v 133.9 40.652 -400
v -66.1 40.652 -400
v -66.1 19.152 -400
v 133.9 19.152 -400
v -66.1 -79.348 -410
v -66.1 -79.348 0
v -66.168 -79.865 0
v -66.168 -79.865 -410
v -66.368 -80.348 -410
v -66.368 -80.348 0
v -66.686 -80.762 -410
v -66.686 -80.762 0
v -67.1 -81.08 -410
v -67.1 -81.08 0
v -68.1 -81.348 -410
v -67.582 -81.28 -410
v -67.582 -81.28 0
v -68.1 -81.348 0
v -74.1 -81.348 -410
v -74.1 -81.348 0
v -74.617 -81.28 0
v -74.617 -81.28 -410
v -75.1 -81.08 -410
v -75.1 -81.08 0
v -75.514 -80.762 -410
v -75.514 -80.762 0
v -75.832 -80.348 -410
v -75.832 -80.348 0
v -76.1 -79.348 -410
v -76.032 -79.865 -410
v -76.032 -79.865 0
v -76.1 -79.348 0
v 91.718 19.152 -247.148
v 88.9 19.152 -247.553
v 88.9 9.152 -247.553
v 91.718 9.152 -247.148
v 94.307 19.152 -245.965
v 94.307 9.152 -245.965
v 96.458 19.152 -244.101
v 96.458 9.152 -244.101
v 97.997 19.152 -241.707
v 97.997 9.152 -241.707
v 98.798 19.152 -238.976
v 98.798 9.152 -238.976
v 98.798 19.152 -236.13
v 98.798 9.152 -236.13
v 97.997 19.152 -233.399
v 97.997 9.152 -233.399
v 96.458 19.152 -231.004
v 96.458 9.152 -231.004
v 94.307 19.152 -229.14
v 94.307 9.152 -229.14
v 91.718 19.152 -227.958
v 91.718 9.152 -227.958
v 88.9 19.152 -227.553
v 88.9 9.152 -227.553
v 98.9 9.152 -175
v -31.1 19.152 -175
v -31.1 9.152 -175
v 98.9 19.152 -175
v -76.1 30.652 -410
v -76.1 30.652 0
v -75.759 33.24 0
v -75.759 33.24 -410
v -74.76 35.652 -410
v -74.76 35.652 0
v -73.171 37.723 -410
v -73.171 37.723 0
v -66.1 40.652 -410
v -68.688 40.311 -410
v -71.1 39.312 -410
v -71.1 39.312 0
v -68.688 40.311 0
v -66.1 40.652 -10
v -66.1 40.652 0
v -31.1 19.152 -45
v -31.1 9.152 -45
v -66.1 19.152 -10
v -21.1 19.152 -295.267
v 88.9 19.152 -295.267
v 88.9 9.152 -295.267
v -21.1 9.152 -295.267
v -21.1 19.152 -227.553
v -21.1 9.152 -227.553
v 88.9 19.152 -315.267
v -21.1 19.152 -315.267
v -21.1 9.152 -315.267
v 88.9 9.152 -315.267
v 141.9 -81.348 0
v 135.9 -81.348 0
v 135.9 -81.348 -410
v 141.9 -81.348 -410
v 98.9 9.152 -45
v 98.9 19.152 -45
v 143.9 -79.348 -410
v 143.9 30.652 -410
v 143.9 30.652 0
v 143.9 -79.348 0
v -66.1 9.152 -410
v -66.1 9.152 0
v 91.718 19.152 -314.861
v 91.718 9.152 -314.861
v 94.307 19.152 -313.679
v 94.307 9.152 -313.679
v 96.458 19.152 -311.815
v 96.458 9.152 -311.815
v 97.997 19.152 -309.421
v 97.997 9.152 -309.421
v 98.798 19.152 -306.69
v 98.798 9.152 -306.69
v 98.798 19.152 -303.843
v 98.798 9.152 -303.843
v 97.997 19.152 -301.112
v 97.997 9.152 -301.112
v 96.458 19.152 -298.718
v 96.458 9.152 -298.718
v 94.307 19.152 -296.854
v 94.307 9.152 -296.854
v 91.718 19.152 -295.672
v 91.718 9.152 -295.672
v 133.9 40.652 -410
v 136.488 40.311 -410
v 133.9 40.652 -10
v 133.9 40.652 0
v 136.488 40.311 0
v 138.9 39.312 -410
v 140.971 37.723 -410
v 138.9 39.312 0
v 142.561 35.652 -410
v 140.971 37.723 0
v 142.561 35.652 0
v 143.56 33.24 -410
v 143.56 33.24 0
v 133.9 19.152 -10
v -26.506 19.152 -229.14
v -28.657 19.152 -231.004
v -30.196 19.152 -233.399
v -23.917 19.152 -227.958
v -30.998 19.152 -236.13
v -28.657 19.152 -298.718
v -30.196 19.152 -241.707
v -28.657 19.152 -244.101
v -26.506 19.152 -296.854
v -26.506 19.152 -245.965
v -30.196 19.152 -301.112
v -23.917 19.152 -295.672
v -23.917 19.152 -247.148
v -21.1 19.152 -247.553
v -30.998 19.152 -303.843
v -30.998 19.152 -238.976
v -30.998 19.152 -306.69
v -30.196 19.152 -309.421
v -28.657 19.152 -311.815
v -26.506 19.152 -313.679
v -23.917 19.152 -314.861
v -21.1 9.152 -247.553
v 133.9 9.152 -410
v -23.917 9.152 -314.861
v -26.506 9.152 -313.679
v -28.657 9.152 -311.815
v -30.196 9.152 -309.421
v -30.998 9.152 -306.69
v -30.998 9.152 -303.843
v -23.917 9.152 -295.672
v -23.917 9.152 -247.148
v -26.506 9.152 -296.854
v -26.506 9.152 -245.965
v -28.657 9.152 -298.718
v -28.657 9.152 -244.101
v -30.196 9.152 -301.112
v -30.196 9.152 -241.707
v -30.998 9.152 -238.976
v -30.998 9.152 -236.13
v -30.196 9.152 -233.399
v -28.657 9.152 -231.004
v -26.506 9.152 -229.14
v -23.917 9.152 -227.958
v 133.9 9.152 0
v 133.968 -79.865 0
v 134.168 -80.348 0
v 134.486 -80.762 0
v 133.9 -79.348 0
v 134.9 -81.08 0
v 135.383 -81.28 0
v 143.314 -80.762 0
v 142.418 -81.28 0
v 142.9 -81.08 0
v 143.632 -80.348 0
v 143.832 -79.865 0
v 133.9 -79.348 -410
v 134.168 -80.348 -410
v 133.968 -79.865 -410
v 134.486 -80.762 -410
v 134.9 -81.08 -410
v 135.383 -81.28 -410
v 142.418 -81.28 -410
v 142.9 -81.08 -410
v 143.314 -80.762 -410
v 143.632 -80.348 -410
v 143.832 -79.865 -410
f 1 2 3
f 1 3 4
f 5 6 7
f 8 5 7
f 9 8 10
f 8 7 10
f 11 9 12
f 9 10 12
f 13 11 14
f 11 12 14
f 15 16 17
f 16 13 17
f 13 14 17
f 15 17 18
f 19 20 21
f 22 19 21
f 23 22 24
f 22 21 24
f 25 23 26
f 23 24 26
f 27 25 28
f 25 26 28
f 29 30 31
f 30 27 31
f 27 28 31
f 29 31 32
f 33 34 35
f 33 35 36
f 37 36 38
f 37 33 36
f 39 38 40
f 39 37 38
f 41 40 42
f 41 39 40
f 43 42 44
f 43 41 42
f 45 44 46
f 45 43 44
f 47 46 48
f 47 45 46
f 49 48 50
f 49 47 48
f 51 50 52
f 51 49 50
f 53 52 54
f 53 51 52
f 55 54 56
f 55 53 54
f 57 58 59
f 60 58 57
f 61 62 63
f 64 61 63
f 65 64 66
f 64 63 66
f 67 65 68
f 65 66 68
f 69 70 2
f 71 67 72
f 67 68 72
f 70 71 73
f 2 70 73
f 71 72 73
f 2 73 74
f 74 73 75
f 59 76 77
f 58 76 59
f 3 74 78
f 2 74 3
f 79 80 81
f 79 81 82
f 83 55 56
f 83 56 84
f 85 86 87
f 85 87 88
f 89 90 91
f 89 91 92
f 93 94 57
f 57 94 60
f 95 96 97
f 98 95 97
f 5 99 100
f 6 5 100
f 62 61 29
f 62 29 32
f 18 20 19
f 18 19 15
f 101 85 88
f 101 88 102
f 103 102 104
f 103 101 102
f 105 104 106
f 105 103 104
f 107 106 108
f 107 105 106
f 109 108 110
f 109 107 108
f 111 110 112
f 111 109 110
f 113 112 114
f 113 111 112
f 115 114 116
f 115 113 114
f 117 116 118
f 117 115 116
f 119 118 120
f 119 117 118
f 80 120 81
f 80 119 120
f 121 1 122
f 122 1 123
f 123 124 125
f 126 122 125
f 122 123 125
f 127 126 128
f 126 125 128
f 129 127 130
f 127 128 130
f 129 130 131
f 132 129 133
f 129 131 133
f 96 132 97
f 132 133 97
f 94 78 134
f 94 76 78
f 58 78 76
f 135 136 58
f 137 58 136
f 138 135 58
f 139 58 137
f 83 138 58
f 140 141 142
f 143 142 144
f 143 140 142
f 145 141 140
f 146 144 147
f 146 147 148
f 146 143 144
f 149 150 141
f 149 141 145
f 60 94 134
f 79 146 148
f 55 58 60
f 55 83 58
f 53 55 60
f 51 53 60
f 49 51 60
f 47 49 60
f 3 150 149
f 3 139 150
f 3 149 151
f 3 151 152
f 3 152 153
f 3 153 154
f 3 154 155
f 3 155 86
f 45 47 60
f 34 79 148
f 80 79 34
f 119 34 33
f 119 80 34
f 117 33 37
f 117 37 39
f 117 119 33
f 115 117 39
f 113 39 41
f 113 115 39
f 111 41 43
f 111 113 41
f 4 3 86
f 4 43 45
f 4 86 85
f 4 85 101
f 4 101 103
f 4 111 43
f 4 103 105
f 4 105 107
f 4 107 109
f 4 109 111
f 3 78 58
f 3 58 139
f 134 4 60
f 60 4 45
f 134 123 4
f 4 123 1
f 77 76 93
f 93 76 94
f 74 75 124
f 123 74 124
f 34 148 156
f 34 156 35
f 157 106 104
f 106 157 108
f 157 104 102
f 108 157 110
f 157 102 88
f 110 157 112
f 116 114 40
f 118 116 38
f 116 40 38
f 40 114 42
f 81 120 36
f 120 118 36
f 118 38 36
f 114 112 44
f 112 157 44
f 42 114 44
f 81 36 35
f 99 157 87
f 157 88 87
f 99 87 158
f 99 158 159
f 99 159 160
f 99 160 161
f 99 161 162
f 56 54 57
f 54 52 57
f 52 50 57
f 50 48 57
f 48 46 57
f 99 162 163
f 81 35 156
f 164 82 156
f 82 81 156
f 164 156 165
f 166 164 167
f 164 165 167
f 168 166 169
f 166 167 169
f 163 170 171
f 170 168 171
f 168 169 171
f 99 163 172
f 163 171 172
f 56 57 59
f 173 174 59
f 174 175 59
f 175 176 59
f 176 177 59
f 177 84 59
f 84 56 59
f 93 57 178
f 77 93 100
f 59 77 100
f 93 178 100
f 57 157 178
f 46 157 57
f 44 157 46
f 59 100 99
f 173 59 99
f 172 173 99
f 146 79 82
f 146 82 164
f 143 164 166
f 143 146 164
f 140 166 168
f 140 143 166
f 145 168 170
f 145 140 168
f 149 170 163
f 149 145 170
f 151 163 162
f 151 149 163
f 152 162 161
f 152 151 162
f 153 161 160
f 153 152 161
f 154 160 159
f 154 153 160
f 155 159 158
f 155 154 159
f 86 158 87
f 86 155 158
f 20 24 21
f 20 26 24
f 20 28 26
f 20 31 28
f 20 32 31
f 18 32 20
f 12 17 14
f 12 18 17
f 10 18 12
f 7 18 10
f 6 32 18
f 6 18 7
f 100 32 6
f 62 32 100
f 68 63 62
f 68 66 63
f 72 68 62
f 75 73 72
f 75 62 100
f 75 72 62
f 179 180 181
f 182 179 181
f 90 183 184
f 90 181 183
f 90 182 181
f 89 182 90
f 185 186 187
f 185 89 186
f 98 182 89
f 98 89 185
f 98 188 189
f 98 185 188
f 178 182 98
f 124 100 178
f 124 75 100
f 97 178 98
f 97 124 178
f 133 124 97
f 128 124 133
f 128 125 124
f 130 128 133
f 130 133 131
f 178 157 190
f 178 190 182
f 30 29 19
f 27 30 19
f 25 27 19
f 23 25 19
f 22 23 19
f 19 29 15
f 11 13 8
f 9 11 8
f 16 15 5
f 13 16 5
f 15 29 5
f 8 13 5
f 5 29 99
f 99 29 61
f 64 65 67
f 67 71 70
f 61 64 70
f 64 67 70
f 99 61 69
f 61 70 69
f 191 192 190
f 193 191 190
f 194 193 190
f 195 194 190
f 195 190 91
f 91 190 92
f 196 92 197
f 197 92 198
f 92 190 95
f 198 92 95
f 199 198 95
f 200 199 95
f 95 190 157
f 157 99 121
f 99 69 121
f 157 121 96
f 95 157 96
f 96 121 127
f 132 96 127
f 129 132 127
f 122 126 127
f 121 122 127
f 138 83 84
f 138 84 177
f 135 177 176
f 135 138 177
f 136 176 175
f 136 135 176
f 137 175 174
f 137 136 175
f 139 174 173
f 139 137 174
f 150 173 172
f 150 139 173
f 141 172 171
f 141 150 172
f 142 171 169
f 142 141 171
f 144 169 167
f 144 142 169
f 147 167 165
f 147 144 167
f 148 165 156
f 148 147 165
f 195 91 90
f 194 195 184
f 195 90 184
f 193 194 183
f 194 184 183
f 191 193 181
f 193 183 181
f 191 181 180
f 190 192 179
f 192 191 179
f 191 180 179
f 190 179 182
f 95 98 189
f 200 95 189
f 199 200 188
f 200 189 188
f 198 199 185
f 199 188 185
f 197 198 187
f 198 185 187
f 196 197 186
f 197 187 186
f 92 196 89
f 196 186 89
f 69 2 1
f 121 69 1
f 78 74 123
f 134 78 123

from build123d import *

# Parameters (mm, degrees)
BOSS_EXTRUDE1_DEPTH = 410
SKETCH4_W           = 200
SKETCH4_H           = 390
CUT_EXTRUDE1_DEPTH  = 21.5
SKETCH5_W           = 130
SKETCH5_H           = 130
CUT_EXTRUDE2_DEPTH  = 30
SKETCH9_W           = 10
SKETCH9_H           = 410
BOSS_EXTRUDE2_DEPTH = 2
SKETCH10_W          = 10
SKETCH10_H          = 410
BOSS_EXTRUDE3_DEPTH = 2
CUT_EXTRUDE4_DEPTH  = 600


with BuildPart() as part:
    # Sketch3 → Boss-Extrude1 (new body)
    with BuildSketch(Plane.XY):
        Polygon((-76.099744246, 40.652173913), (143.900255754, 40.652173913), (143.900255754, -79.347826087), (133.900255754, -79.347826087), (133.900255754, 9.152173913), (-66.099744246, 9.152173913), (-66.099744246, -79.347826087), (-76.099744246, -79.347826087), align=None)
    extrude(amount=-BOSS_EXTRUDE1_DEPTH)

    # Sketch4 → Cut-Extrude1 (cut)
    with BuildSketch(Plane(origin=(0, 40.652173913, 0), x_dir=(1, 0, 0), z_dir=(0, 1, 0))):
        with Locations((33.900255754, 205)):
            Rectangle(SKETCH4_W, SKETCH4_H)
    extrude(amount=-CUT_EXTRUDE1_DEPTH, mode=Mode.SUBTRACT)

    # Sketch5 → Cut-Extrude2 (cut)
    with BuildSketch(Plane(origin=(0, 19.152173913, 0), x_dir=(1, 0, 0), z_dir=(0, 1, 0))):
        with Locations((33.900255754, 110)):
            Rectangle(SKETCH5_W, SKETCH5_H)
        with BuildLine():
            Line((-21.099744246, 247.552781264), (88.900255754, 247.552781264))
            ThreePointArc((88.900255754, 247.552781264), (98.900255754, 237.552781264), (88.900255754, 227.552781264))
            Line((88.900255754, 227.552781264), (-21.099744246, 227.552781264))
            ThreePointArc((-21.099744246, 227.552781264), (-31.099744246, 237.552781264), (-21.099744246, 247.552781264))
        make_face()
        with BuildLine():
            Line((-21.099744246, 315.266550997), (88.900255754, 315.266550997))
            ThreePointArc((88.900255754, 315.266550997), (98.900255754, 305.266550997), (88.900255754, 295.266550997))
            Line((88.900255754, 295.266550997), (-21.099744246, 295.266550997))
            ThreePointArc((-21.099744246, 295.266550997), (-31.099744246, 305.266550997), (-21.099744246, 315.266550997))
        make_face()
    extrude(amount=-CUT_EXTRUDE2_DEPTH, mode=Mode.SUBTRACT)

    # Sketch9 → Boss-Extrude2 (add)
    with BuildSketch(Plane.XZ.offset(79.347826087)):
        with Locations((138.900255754, -205)):
            Rectangle(SKETCH9_W, SKETCH9_H)
    extrude(amount=BOSS_EXTRUDE2_DEPTH)

    # Sketch10 → Boss-Extrude3 (add)
    with BuildSketch(Plane.XZ.offset(79.347826087)):
        with Locations((-71.099744246, -205)):
            Rectangle(SKETCH10_W, SKETCH10_H)
    extrude(amount=BOSS_EXTRUDE3_DEPTH)

    # Sketch11 → Cut-Extrude4 (cut)
    with BuildSketch(Plane.XY):
        with BuildLine():
            Line((-76.099744246, 40.652173913), (-76.099744246, 30.652173913))
            ThreePointArc((-76.099744246, 30.652173913), (-73.170812057, 37.723241725), (-66.099744246, 40.652173913))
            Line((-66.099744246, 40.652173913), (-76.099744246, 40.652173913))
        make_face()
        with BuildLine():
            Line((143.900255754, 40.652173913), (133.900255754, 40.652173913))
            ThreePointArc((133.900255754, 40.652173913), (140.971323566, 37.723241725), (143.900255754, 30.652173913))
            Line((143.900255754, 30.652173913), (143.900255754, 40.652173913))
        make_face()
        with BuildLine():
            Line((143.900255754, -81.347826087), (143.900255754, -79.347826087))
            ThreePointArc((143.900255754, -79.347826087), (143.314469317, -80.762039649), (141.900255754, -81.347826087))
            Line((141.900255754, -81.347826087), (143.900255754, -81.347826087))
        make_face()
        with BuildLine():
            Line((133.900255754, -81.347826087), (135.900255754, -81.347826087))
            ThreePointArc((135.900255754, -81.347826087), (134.486042192, -80.762039649), (133.900255754, -79.347826087))
            Line((133.900255754, -79.347826087), (133.900255754, -81.347826087))
        make_face()
        with BuildLine():
            ThreePointArc((-74.099744246, -81.347826087), (-75.513957808, -80.762039649), (-76.099744246, -79.347826087))
            Line((-76.099744246, -79.347826087), (-76.099744246, -81.347826087))
            Line((-76.099744246, -81.347826087), (-74.099744246, -81.347826087))
        make_face()
        with BuildLine():
            ThreePointArc((-66.099744246, -79.347826087), (-66.685530683, -80.762039649), (-68.099744246, -81.347826087))
            Line((-68.099744246, -81.347826087), (-66.099744246, -81.347826087))
            Line((-66.099744246, -81.347826087), (-66.099744246, -79.347826087))
        make_face()
    extrude(amount=-CUT_EXTRUDE4_DEPTH, mode=Mode.SUBTRACT)


solid = part.part
